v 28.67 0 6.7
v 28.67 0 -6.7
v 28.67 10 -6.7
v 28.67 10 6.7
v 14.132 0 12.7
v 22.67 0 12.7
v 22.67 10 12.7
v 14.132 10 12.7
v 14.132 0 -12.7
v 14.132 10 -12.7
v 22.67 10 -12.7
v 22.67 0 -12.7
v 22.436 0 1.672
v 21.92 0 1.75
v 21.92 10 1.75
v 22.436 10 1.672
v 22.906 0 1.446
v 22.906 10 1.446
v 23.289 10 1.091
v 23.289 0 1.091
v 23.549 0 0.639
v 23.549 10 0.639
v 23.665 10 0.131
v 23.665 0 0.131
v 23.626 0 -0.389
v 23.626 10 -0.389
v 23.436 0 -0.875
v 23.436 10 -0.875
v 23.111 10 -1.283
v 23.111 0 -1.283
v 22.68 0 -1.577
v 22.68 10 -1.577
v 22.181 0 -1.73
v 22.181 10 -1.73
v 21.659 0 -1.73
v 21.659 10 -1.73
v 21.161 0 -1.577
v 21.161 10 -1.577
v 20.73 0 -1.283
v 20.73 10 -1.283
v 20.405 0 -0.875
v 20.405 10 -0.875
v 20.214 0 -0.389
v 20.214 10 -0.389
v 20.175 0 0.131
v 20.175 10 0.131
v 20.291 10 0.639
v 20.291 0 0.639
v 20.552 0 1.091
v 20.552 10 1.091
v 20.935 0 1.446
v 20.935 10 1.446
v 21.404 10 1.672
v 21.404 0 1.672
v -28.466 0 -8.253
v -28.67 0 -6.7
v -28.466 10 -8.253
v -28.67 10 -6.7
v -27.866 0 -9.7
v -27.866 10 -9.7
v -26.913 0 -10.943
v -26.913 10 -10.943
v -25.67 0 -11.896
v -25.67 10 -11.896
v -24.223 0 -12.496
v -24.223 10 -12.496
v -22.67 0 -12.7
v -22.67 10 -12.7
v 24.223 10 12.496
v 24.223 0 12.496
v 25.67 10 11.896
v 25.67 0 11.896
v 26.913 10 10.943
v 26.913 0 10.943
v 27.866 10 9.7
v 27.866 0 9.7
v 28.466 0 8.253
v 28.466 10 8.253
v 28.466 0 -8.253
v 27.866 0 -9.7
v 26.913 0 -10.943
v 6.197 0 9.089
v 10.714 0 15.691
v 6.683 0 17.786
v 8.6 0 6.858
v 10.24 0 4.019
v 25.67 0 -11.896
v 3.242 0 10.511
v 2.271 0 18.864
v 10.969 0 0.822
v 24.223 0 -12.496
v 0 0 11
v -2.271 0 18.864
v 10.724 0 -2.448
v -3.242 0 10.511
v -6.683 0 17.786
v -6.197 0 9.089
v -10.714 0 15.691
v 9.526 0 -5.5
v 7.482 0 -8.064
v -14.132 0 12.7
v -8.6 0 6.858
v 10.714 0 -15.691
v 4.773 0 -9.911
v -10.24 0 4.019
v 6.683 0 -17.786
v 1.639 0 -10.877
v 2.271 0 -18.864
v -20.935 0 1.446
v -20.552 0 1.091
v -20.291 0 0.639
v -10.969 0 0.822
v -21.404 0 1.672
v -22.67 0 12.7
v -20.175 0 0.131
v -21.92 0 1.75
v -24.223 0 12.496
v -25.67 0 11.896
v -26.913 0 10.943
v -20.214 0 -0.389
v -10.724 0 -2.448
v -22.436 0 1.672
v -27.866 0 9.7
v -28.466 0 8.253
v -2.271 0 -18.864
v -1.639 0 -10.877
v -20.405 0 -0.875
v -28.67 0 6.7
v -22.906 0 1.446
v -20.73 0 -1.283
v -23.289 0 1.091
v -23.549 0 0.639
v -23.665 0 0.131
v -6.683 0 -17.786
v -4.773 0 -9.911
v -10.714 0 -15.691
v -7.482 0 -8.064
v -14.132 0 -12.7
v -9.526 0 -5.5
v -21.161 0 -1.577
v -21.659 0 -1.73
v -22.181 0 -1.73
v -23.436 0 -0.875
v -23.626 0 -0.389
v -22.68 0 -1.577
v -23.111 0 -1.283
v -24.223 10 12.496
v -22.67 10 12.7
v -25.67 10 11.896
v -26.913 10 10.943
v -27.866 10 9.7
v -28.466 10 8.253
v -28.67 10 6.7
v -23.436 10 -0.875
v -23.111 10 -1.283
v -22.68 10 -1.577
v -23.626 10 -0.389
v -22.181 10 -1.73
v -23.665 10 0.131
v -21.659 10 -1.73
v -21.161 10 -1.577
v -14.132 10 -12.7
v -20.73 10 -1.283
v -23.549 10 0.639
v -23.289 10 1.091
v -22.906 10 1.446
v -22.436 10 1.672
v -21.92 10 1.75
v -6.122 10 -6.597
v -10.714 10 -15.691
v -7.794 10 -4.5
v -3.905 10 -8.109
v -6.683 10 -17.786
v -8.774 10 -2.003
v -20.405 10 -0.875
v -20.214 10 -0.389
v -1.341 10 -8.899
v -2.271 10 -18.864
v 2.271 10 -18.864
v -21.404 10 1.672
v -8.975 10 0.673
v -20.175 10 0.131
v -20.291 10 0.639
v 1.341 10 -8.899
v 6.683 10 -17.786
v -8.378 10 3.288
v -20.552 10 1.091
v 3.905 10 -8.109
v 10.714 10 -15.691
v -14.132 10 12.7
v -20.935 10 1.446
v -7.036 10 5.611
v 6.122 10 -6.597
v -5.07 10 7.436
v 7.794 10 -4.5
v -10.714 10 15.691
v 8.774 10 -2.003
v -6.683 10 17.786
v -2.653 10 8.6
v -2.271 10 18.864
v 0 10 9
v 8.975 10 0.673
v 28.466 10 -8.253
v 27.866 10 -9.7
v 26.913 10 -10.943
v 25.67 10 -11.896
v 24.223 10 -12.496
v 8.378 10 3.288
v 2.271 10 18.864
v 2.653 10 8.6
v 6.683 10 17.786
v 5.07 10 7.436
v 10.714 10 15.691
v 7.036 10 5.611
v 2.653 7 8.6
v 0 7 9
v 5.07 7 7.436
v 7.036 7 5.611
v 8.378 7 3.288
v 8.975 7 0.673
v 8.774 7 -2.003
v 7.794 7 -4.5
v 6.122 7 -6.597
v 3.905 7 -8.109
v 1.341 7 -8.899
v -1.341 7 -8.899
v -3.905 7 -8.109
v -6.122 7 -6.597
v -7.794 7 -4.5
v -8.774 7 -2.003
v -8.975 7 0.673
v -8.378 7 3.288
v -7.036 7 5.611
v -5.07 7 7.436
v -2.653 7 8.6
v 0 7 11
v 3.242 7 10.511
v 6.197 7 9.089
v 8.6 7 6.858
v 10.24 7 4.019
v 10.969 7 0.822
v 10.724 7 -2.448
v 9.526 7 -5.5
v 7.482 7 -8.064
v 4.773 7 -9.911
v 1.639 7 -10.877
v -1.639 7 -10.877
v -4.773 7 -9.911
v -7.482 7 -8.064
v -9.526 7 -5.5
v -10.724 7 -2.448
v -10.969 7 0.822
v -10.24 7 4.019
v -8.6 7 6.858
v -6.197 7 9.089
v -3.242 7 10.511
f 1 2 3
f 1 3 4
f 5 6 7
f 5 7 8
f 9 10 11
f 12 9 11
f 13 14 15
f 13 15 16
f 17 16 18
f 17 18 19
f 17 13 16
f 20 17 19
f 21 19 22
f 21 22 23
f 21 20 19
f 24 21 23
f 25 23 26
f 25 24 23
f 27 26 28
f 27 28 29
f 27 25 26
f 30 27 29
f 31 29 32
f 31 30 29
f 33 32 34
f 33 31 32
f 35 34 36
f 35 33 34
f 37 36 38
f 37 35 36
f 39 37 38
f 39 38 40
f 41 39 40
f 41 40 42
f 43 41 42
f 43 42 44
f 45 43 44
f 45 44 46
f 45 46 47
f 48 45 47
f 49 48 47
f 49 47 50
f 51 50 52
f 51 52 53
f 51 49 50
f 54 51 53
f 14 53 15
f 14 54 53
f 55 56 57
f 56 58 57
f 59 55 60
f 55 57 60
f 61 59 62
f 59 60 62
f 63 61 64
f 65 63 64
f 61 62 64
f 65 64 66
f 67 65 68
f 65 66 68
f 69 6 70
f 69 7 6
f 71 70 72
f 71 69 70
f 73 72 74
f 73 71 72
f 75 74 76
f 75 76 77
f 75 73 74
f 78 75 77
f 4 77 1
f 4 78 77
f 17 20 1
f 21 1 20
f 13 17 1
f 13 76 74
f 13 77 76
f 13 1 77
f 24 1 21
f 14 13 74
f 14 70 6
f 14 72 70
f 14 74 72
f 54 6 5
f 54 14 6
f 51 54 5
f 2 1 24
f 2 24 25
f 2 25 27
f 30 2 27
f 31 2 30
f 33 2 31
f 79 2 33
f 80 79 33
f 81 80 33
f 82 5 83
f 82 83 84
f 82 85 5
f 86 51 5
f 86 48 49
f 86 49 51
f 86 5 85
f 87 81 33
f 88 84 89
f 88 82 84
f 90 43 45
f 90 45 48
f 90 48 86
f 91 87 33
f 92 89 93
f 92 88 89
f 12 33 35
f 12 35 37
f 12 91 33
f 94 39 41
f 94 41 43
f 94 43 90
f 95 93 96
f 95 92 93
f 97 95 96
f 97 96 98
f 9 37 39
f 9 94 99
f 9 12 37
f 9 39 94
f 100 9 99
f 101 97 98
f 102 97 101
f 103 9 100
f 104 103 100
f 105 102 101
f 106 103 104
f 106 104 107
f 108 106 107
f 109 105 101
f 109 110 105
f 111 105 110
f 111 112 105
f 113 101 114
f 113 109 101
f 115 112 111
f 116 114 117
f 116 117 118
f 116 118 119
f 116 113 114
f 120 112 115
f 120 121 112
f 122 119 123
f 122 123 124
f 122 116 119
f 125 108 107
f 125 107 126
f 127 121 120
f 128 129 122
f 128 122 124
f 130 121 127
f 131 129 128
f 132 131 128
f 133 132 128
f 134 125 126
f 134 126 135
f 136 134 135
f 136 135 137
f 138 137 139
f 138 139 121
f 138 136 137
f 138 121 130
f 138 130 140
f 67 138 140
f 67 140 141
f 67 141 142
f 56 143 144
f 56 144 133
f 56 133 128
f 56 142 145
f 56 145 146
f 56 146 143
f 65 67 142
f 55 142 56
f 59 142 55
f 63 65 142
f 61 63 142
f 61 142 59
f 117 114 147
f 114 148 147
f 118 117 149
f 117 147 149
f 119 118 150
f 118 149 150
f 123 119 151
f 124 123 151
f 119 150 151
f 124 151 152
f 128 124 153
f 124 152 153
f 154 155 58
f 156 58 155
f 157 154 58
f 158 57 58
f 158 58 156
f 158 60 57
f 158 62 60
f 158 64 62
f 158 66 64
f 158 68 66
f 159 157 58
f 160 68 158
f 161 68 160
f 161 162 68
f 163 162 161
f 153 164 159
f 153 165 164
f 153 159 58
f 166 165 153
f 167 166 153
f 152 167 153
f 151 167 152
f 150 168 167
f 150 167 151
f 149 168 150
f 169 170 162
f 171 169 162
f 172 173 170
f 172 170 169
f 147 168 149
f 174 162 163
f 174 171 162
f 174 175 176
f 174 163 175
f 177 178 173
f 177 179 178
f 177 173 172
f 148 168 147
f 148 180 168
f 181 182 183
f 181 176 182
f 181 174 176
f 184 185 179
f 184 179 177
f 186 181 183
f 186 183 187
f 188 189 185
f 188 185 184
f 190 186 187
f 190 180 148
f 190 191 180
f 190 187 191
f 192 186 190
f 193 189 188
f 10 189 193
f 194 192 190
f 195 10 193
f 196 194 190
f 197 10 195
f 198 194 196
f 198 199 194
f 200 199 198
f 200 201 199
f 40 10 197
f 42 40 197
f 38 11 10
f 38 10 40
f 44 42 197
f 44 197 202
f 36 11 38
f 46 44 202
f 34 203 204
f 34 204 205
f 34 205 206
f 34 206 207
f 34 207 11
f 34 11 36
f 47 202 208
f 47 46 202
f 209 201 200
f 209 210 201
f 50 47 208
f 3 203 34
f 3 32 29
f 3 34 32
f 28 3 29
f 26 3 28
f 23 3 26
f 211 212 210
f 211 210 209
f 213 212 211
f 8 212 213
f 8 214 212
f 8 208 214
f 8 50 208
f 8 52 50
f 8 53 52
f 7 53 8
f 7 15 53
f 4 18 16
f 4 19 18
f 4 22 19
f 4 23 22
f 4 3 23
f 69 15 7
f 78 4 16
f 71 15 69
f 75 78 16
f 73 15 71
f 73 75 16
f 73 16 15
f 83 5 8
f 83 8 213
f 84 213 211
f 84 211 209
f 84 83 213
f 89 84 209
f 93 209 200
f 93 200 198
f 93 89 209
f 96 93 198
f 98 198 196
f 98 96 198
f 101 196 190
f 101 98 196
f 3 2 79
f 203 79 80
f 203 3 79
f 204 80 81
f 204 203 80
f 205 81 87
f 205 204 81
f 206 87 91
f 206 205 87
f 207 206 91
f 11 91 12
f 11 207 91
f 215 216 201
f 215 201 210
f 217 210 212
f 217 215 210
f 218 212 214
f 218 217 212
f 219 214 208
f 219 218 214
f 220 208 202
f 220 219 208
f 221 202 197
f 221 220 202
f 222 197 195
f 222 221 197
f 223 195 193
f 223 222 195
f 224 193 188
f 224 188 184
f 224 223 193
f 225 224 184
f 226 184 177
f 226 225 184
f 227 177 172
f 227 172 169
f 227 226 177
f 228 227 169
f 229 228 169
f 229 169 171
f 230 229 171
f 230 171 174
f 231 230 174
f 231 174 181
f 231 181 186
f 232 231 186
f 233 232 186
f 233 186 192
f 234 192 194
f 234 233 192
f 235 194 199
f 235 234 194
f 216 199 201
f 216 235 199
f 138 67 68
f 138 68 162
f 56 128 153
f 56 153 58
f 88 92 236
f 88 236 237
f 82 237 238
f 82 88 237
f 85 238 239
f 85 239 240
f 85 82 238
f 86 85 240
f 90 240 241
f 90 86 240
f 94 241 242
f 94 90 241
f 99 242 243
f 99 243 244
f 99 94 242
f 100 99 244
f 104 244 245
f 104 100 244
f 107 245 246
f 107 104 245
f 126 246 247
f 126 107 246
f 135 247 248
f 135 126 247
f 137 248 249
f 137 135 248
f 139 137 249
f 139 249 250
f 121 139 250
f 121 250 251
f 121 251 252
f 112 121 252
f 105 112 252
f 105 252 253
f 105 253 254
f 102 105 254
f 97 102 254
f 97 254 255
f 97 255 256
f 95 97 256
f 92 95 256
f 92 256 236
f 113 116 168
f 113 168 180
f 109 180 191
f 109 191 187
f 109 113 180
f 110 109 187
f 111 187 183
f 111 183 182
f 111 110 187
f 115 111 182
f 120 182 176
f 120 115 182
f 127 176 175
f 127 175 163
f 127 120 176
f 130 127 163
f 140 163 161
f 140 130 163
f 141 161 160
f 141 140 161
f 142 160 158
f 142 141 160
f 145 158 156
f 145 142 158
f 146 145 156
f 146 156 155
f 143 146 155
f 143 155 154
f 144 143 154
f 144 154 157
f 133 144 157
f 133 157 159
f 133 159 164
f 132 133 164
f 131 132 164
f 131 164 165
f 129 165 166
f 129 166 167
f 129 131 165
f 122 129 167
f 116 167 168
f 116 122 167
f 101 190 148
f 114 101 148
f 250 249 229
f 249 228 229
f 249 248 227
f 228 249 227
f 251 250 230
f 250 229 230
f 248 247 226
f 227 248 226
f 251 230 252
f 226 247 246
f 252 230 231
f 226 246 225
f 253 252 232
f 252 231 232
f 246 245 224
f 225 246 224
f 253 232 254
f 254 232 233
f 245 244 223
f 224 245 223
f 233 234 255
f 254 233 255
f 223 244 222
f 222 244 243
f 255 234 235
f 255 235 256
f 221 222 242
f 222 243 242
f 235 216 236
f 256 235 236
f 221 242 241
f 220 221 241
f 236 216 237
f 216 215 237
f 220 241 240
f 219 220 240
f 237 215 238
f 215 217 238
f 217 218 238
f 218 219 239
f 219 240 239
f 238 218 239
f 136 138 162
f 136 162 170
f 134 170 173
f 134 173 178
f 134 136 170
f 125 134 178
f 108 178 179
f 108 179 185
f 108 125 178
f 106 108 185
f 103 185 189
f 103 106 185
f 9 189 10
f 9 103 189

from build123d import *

# Parameters (mm, degrees)
SKETCH1_R           = 11
SKETCH1_R_2         = 1.75
BOSS_EXTRUDE1_DEPTH = 10
BOSS_EXTRUDE2_START = -3
SKETCH2_R           = 11
SKETCH2_R_2         = 9
BOSS_EXTRUDE2_DEPTH = 3
FILLET1_R           = 6


with BuildPart() as part:
    # Sketch1 → Boss-Extrude1 (new body)
    with BuildSketch(Plane(origin=(0, 0, 0), x_dir=(1, 0, 0), z_dir=(0, 1, 0))):
        with BuildLine():
            Line((28.670310217, -12.7), (14.131878856, -12.7))
            ThreePointArc((14.131878856, -12.7), (0, -19), (-14.131878856, -12.7))
            Line((-14.131878856, -12.7), (-28.670310217, -12.7))
            Line((-28.670310217, -12.7), (-28.670310217, 12.7))
            Line((-28.670310217, 12.7), (-14.131878856, 12.7))
            ThreePointArc((-14.131878856, 12.7), (0, 19), (14.131878856, 12.7))
            Line((14.131878856, 12.7), (28.670310217, 12.7))
            Line((28.670310217, 12.7), (28.670310217, -12.7))
        make_face()
        with Locations(Location((0, 0, 0), (0, 0, 270))):
            Circle(SKETCH1_R, mode=Mode.SUBTRACT)
        with Locations(Location((21.920310217, 0, 0), (0, 0, 270))):
            Circle(SKETCH1_R_2, mode=Mode.SUBTRACT)
        with Locations(Location((-21.920310217, 0, 0), (0, 0, 270))):
            Circle(SKETCH1_R_2, mode=Mode.SUBTRACT)
    extrude(amount=BOSS_EXTRUDE1_DEPTH)

    # Sketch2 → Boss-Extrude2 (add)
    with BuildSketch(Plane(origin=(0, 10, 0), x_dir=(1, 0, 0), z_dir=(0, 1, 0)).offset(BOSS_EXTRUDE2_START)):
        with Locations(Location((0, 0, 0), (0, 0, 270))):
            Circle(SKETCH2_R)
        with Locations(Location((0, 0, 0), (0, 0, 270))):
            Circle(SKETCH2_R_2, mode=Mode.SUBTRACT)
    extrude(amount=BOSS_EXTRUDE2_DEPTH)

    # Fillet1
    fillet1_edges = [part.edges().sort_by_distance(p)[0] for p in [
        (28.670310217, 5, -12.7),
        (28.670310217, 5, 12.7),
        (-28.670310217, 5, 12.7),
        (-28.670310217, 5, -12.7),
    ]]
    fillet(fillet1_edges, radius=FILLET1_R)


solid = part.part
